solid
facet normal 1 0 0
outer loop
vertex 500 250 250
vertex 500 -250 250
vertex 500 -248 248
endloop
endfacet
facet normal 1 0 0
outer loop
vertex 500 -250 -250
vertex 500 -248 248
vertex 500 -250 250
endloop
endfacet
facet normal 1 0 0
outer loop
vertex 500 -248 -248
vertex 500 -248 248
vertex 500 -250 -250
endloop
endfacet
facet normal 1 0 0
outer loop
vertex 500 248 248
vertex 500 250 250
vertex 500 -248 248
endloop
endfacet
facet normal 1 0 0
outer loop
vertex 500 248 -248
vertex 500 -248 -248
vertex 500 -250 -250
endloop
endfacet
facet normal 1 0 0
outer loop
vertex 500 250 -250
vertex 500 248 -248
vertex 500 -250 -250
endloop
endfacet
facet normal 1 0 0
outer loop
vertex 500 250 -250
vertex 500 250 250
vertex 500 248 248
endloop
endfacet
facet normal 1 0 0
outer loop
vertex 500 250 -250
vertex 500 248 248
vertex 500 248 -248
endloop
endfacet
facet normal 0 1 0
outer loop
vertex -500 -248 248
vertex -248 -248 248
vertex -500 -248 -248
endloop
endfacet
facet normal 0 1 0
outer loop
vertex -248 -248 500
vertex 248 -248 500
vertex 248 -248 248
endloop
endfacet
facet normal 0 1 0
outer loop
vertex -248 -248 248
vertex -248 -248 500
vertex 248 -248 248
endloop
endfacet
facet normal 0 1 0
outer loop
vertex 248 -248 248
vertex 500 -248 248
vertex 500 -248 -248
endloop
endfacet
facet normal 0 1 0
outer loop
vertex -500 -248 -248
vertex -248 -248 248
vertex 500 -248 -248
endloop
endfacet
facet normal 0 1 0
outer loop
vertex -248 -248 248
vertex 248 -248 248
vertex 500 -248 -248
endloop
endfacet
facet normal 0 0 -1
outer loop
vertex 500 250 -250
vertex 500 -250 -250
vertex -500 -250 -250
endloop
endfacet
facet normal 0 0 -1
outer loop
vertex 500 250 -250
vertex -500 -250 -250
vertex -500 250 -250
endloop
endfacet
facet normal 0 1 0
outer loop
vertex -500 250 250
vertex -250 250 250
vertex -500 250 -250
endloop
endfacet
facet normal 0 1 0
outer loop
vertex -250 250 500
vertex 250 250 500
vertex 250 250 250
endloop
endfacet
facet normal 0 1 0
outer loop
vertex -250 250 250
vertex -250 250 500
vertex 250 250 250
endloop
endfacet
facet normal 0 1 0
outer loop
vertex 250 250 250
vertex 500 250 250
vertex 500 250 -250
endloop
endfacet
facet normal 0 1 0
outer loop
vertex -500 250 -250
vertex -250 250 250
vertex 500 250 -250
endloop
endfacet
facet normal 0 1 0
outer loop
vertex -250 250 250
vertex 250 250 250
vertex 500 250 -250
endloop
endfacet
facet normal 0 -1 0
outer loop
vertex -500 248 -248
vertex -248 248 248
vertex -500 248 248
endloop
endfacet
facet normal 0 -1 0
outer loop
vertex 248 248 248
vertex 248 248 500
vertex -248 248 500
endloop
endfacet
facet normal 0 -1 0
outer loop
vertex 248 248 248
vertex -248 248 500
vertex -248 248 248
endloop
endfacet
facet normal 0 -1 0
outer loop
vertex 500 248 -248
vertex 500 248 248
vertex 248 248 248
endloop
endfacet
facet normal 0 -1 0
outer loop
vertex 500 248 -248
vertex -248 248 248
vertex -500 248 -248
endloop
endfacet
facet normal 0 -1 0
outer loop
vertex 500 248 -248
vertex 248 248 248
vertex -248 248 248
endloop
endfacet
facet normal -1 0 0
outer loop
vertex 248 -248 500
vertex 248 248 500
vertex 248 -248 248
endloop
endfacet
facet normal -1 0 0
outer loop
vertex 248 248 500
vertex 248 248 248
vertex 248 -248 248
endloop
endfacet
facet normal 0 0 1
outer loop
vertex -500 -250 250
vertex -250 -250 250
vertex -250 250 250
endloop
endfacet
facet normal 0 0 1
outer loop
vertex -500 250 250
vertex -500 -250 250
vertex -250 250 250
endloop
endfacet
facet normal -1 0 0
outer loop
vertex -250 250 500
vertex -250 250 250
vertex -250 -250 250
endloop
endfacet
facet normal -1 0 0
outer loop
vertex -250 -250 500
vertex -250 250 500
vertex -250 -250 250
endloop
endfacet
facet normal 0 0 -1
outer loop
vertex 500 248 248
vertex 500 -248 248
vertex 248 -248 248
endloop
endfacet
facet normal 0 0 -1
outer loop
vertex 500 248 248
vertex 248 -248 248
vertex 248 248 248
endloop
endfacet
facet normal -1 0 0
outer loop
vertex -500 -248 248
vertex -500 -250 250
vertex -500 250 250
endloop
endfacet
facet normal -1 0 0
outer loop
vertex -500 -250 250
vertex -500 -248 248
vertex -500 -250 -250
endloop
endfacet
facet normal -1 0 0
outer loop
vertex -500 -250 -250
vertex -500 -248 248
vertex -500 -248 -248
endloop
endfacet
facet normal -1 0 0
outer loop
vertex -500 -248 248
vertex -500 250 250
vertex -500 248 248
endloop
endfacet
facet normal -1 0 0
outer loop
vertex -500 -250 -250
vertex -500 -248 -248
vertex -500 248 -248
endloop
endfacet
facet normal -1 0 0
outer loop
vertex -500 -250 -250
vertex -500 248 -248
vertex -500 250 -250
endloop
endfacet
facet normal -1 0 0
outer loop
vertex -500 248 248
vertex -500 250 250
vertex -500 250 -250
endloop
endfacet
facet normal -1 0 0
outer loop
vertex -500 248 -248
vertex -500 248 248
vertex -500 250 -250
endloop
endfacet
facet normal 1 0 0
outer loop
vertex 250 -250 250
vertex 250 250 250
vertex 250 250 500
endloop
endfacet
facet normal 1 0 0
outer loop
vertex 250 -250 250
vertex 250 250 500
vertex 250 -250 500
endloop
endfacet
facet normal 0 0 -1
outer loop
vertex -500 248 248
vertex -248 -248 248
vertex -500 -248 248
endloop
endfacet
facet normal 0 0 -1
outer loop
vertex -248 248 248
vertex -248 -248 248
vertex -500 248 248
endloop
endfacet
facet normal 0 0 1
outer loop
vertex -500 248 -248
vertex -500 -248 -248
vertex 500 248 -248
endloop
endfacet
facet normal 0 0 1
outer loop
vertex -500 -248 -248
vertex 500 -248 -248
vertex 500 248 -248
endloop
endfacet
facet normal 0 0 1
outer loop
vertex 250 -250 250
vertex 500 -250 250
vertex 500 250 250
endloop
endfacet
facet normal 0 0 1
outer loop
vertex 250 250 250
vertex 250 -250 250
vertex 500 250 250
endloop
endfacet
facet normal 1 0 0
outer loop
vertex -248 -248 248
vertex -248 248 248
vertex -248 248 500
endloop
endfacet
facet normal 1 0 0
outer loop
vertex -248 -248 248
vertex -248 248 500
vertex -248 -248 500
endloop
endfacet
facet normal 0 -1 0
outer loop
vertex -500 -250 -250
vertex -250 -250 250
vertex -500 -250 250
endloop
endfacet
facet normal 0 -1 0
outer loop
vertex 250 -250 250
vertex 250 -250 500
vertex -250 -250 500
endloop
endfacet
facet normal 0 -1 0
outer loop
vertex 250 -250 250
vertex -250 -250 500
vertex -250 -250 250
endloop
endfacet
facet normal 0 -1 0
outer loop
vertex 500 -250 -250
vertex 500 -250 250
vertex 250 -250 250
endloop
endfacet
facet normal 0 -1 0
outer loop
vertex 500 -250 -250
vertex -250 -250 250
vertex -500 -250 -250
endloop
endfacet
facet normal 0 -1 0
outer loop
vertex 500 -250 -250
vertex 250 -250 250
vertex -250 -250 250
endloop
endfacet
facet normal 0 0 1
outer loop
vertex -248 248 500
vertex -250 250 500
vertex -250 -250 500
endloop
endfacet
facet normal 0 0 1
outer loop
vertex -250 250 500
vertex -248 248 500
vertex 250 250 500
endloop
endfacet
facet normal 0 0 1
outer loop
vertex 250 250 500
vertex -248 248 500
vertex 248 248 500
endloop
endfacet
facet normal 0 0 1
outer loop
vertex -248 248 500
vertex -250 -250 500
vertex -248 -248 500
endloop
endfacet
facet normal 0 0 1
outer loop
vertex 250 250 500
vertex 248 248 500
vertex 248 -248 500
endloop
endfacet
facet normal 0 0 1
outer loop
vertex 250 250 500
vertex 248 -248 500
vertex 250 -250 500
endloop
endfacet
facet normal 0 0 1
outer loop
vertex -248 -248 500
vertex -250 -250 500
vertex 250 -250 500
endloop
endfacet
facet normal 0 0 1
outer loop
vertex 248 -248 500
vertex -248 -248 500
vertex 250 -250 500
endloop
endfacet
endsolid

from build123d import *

# Parameters (mm, degrees)
SKETCH1_W           = 500
SKETCH1_H           = 500
SKETCH1_W_2         = 496
SKETCH1_H_2         = 496
EXTRUDE_THIN1_DEPTH = 500
SKETCH2_W           = 500
SKETCH2_H           = 500
SKETCH2_W_2         = 496
SKETCH2_H_2         = 496
EXTRUDE_THIN2_DEPTH = 250
CUT_EXTRUDE1_REACH  = 1348.291
SKETCH3_W           = 496
SKETCH3_H           = 496


with BuildPart() as part:
    # Sketch1 → Extrude-Thin1 (new, symmetric)
    with BuildSketch(Plane(origin=(0, 0, 0), x_dir=(0, 0, -1), z_dir=(1, 0, 0))):
        Rectangle(SKETCH1_W, SKETCH1_H)
        Rectangle(SKETCH1_W_2, SKETCH1_H_2, mode=Mode.SUBTRACT)
    extrude(amount=EXTRUDE_THIN1_DEPTH, both=True)

    # Sketch2 → Extrude-Thin2 (add)
    with BuildSketch(Plane(origin=(0, -250, 250), x_dir=(1, 0, 0), z_dir=(0, 0, -1))):
        with Locations((0, -250)):
            Rectangle(SKETCH2_W, SKETCH2_H)
        with Locations((0, -250)):
            Rectangle(SKETCH2_W_2, SKETCH2_H_2, mode=Mode.SUBTRACT)
    extrude(amount=-EXTRUDE_THIN2_DEPTH)

    # Sketch3 → Cut-Extrude1 (cut, up to next)
    with BuildSketch(Plane(origin=(0, -750, 500), x_dir=(1, 0, 0), z_dir=(0, 0, -1)), mode=Mode.PRIVATE) as cut_extrude1_sk1:
        with Locations((0, -750)):
            Rectangle(SKETCH3_W, SKETCH3_H)
    cut_extrude1_tool1 = extrude(cut_extrude1_sk1.sketch, amount=CUT_EXTRUDE1_REACH, mode=Mode.PRIVATE) & part.part
    add(cut_extrude1_tool1.solids().sort_by_distance((0, 0, 500))[0], mode=Mode.SUBTRACT)


solid = part.part
